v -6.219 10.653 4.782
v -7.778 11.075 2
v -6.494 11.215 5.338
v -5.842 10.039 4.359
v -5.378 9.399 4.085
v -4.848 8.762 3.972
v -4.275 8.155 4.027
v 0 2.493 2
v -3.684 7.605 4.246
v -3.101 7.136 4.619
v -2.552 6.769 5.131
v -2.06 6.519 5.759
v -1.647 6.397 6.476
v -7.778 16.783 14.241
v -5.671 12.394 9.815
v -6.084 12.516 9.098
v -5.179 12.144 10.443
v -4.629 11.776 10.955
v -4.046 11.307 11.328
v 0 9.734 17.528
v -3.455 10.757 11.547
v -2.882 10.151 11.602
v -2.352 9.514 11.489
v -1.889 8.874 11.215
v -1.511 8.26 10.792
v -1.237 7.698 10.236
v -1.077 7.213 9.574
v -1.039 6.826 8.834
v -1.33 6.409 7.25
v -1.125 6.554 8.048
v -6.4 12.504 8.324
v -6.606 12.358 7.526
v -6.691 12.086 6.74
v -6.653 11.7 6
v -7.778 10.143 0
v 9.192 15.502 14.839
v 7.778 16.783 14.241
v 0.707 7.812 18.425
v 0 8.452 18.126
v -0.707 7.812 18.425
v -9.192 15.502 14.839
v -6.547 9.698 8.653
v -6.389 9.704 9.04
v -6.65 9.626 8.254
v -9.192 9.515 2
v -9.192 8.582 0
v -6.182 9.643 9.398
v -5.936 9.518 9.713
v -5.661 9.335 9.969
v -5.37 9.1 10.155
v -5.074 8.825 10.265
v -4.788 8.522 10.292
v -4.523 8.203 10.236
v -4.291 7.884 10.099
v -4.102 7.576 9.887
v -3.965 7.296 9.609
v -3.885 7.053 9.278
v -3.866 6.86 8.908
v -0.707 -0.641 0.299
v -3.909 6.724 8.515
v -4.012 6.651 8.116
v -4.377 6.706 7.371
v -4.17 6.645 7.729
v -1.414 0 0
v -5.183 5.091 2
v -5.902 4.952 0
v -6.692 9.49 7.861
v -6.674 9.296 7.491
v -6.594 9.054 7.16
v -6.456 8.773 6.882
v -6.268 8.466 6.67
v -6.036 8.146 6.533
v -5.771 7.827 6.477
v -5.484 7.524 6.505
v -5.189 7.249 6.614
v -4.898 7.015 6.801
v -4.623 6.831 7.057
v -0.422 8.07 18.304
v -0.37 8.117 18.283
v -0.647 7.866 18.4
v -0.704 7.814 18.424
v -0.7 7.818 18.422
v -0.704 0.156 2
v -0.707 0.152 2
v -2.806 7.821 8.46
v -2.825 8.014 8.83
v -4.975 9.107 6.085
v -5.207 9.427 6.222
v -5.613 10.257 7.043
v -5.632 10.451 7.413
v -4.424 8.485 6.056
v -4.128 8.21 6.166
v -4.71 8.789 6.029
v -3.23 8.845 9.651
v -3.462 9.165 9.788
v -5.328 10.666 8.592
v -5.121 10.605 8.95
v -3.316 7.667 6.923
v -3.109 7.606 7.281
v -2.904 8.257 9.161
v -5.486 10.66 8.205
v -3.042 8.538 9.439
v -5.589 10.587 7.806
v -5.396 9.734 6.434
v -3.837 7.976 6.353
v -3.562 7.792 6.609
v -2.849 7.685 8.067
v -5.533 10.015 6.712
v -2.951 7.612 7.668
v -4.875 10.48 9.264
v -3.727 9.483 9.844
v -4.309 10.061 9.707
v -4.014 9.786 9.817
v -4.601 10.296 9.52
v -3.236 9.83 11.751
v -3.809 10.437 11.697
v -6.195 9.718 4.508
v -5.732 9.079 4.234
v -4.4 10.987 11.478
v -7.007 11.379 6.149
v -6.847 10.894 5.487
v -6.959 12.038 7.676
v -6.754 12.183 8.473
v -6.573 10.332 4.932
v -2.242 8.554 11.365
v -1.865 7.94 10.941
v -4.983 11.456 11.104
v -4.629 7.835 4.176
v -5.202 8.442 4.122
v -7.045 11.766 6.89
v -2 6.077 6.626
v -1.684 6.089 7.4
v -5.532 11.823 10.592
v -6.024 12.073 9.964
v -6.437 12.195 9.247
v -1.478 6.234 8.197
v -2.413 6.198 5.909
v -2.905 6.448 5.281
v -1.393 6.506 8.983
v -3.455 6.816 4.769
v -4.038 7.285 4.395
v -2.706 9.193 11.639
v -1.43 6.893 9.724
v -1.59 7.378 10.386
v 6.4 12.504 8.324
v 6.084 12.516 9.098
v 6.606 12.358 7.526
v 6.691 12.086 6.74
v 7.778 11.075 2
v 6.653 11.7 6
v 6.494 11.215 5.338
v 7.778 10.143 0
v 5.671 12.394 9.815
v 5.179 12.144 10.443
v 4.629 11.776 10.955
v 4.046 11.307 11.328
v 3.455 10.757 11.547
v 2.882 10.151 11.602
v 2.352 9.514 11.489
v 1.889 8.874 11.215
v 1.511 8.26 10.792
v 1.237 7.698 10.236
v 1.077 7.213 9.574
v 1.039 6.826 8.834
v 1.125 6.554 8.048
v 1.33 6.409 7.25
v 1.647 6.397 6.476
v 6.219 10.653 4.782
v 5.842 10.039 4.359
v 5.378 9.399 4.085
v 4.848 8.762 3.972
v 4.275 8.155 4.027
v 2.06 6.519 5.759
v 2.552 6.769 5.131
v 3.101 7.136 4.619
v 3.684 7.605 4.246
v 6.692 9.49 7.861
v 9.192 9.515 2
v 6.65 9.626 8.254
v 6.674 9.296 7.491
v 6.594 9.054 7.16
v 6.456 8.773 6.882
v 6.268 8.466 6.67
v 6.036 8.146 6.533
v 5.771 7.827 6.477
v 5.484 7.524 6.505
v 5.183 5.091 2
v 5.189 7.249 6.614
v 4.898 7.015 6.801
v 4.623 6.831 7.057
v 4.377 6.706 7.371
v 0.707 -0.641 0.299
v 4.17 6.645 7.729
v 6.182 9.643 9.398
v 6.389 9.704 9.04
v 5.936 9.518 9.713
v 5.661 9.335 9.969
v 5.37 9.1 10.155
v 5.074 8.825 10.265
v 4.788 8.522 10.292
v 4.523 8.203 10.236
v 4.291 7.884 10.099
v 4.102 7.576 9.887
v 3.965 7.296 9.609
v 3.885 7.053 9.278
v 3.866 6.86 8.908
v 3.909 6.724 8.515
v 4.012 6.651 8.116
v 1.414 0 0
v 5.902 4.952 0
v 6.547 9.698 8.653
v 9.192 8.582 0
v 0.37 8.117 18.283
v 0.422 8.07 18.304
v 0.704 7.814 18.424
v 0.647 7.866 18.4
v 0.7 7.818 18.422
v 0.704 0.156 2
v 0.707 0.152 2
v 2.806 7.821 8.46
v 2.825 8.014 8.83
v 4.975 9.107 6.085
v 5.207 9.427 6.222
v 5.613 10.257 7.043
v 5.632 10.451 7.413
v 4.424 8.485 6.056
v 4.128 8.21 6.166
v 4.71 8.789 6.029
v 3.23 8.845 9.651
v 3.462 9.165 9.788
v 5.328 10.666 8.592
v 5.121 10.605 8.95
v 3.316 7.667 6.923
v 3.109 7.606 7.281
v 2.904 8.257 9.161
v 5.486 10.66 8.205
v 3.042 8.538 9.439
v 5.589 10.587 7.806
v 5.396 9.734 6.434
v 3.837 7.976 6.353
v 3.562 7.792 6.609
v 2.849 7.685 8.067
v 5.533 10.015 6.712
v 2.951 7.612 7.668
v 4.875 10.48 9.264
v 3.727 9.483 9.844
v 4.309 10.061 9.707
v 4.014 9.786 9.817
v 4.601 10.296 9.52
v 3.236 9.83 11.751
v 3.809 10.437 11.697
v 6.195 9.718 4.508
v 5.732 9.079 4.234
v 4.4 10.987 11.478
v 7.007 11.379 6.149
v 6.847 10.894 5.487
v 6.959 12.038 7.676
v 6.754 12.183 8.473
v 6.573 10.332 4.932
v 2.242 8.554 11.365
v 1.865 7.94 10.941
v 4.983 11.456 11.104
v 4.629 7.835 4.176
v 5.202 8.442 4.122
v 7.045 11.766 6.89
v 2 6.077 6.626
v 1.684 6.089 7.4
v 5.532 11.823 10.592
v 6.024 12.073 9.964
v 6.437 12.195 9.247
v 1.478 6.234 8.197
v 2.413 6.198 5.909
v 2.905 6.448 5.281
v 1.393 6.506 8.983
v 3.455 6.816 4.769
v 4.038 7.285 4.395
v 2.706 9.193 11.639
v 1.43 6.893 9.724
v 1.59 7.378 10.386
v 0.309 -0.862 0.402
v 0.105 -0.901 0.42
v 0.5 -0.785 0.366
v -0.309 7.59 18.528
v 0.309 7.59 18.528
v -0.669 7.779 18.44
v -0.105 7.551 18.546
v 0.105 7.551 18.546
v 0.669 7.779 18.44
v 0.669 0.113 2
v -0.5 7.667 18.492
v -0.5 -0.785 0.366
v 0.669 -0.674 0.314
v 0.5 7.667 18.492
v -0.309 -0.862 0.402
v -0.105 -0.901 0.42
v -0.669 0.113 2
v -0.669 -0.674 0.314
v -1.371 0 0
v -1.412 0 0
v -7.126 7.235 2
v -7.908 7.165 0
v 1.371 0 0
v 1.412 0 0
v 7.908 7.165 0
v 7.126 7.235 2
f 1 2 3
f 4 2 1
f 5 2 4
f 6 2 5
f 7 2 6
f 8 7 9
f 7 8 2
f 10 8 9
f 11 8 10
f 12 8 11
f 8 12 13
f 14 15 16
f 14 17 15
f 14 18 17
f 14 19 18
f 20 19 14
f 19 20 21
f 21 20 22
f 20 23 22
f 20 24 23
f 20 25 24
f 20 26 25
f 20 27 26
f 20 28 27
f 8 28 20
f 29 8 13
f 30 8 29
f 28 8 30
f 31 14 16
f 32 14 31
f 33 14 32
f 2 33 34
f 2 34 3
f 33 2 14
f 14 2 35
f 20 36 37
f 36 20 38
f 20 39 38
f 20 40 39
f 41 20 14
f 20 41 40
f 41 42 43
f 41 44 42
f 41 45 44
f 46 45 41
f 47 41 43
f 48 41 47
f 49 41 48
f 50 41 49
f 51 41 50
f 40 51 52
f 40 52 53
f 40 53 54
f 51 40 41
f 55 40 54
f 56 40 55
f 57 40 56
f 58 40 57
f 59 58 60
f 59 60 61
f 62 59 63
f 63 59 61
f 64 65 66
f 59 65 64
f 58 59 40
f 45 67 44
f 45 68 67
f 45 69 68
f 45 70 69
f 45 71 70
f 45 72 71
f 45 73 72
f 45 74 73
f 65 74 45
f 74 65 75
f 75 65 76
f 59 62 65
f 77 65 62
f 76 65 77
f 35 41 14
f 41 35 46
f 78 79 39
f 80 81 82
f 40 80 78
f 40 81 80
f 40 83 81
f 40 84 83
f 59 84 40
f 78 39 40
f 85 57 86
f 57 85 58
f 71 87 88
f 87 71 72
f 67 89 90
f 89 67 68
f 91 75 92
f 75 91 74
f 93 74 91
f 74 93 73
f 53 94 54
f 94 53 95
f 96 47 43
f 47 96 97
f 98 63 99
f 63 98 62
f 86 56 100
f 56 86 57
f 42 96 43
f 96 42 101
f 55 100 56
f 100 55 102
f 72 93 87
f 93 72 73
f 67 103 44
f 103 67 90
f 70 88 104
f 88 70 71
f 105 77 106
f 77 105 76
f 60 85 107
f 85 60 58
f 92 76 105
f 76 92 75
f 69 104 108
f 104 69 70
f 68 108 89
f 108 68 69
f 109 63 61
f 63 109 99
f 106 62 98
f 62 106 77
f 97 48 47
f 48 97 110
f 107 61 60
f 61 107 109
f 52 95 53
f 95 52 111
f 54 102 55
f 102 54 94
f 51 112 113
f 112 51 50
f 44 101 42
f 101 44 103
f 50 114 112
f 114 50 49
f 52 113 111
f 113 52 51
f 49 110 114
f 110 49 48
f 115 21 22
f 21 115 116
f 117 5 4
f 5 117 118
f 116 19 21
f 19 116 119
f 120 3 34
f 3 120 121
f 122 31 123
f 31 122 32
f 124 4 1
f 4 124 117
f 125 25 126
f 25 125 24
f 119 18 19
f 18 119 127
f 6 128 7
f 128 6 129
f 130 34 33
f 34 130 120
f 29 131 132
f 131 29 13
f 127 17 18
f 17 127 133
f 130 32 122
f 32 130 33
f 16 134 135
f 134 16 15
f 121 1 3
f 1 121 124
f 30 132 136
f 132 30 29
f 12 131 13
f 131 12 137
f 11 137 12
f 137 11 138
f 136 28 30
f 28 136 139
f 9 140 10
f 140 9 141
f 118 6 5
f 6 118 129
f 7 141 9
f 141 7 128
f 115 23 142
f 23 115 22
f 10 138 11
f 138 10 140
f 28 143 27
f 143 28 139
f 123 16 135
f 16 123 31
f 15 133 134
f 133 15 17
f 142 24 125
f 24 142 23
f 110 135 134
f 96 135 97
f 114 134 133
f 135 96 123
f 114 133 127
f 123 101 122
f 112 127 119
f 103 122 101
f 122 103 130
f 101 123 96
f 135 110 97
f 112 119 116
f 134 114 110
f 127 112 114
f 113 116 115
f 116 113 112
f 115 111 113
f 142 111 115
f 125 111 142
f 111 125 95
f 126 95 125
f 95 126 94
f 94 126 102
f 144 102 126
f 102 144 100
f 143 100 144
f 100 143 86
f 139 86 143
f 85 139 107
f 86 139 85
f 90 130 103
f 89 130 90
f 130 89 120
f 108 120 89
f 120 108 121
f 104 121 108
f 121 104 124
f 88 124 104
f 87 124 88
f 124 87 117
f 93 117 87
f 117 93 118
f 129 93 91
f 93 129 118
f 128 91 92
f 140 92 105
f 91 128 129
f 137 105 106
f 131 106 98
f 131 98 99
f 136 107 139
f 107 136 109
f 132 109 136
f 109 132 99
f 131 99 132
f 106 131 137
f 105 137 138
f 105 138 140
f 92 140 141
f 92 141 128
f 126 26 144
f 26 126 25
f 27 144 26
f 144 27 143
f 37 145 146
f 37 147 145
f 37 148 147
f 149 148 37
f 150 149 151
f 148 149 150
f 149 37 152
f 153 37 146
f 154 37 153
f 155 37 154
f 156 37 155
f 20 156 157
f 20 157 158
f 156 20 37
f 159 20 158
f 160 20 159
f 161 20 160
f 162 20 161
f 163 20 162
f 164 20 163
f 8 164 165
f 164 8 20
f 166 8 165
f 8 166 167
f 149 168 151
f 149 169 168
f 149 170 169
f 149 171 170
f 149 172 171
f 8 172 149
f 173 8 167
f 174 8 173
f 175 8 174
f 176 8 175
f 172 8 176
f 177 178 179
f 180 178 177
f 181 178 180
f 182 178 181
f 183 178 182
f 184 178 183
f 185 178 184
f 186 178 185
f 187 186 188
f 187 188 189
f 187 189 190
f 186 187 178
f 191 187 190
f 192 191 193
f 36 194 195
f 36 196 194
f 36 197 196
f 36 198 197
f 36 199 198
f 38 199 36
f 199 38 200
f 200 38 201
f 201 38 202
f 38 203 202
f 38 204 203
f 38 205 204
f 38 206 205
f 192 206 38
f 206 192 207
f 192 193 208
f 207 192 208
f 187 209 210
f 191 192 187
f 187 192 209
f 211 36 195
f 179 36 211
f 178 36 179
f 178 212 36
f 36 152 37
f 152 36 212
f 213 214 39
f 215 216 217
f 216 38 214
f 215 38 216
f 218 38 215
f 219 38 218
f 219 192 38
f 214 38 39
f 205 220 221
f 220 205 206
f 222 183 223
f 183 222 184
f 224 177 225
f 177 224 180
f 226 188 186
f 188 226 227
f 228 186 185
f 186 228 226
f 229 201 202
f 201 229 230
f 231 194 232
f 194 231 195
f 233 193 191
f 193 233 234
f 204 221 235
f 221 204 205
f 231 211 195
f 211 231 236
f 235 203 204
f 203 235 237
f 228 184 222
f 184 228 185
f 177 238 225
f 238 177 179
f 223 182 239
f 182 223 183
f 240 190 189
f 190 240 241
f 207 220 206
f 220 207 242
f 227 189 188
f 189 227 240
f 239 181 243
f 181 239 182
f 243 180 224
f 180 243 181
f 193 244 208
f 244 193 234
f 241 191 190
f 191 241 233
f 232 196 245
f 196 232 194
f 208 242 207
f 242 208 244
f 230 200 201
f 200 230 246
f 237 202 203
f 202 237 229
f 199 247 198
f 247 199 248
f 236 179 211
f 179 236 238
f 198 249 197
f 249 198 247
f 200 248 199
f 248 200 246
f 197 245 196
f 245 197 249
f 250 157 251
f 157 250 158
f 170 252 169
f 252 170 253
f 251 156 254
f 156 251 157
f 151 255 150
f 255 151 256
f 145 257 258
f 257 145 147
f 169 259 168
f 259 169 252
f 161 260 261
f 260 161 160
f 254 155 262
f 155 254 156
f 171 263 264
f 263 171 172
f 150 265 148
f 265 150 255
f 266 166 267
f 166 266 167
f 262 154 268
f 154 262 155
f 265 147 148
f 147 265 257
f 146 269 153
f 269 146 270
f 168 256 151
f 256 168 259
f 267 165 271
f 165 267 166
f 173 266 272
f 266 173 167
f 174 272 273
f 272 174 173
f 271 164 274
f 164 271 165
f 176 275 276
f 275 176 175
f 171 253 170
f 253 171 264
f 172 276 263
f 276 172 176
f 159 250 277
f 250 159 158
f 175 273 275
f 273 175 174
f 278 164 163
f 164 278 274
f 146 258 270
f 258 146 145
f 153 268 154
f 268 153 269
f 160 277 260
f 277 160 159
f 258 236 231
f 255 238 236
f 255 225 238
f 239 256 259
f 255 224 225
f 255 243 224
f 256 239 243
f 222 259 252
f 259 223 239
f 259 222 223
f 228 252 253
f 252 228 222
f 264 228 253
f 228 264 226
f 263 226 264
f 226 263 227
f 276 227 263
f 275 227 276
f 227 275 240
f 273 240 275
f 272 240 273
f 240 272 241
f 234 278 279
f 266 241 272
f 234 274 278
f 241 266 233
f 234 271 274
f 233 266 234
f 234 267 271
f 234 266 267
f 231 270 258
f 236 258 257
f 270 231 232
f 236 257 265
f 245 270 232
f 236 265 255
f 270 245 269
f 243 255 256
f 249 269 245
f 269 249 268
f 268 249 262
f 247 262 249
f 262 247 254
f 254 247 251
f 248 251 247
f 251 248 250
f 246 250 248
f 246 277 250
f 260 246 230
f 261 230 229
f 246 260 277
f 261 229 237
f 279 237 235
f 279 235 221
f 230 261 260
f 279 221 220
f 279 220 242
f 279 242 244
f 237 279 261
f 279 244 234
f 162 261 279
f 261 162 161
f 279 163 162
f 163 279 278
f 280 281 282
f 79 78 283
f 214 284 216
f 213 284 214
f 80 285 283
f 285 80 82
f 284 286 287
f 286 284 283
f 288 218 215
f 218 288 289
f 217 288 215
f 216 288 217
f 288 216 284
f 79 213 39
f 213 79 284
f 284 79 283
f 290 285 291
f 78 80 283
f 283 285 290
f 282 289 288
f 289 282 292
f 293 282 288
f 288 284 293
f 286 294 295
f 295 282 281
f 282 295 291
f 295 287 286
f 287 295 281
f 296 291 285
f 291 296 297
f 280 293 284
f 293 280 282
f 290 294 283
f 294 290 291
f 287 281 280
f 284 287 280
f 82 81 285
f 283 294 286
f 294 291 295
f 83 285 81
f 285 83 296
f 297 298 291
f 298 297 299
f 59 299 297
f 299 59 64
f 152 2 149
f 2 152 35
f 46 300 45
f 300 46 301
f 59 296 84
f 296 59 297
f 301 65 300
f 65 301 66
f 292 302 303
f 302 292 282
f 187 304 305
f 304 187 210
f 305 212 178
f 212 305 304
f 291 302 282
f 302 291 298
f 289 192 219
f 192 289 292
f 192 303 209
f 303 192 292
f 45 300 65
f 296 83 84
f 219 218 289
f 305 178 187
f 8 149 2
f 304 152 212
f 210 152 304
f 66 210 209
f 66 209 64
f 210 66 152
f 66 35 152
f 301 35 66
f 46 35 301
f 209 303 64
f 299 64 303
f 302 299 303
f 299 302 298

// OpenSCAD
//Horizontal angle
angle_1 = 90;

//Vertical angle
angle_2 = 25;

//Height of the bracket
height = 20;

//Width of the bracket
width = 12;

//Thickness
thickness = 2;

//The diameter of the mounting hole
mount_d = 4;

module plane()
{
    rotate([-angle_2,0,0])
    rotate([0,0,angle_1/2])
    translate([-thickness/2,0,0])
    difference()
    {
        cube([thickness,width,height]);
        
        rotate([angle_2/3,0,0])
        translate([-thickness*2,width - mount_d, height/2])
        rotate([0,90,0])
        cylinder(r=mount_d/2,h=4*thickness, $fn=30);

        rotate([angle_2/3,0,0])
        translate([thickness-0.5,width - mount_d, height/2])
        rotate([0,90,0])
        cylinder(r=mount_d,h=thickness, $fn=30);
    }
}

module holder(height)
{
    union()
    {
        plane();

        mirror([1,0,0])
        plane();
        
        rotate([-angle_2,0,0])
        cylinder(r=thickness/2,h=height, $fn=30);
    }
}

difference()
{
    union()
    {
        holder(height);
        difference()
        {
            hull()
            {
                holder(height);
            }
            translate([-width,0,thickness])
            cube([width*2,width*2,height]);
        }
    }
    
    translate([-width,0,-height])
    cube([width*2,width*2,height]);
}

